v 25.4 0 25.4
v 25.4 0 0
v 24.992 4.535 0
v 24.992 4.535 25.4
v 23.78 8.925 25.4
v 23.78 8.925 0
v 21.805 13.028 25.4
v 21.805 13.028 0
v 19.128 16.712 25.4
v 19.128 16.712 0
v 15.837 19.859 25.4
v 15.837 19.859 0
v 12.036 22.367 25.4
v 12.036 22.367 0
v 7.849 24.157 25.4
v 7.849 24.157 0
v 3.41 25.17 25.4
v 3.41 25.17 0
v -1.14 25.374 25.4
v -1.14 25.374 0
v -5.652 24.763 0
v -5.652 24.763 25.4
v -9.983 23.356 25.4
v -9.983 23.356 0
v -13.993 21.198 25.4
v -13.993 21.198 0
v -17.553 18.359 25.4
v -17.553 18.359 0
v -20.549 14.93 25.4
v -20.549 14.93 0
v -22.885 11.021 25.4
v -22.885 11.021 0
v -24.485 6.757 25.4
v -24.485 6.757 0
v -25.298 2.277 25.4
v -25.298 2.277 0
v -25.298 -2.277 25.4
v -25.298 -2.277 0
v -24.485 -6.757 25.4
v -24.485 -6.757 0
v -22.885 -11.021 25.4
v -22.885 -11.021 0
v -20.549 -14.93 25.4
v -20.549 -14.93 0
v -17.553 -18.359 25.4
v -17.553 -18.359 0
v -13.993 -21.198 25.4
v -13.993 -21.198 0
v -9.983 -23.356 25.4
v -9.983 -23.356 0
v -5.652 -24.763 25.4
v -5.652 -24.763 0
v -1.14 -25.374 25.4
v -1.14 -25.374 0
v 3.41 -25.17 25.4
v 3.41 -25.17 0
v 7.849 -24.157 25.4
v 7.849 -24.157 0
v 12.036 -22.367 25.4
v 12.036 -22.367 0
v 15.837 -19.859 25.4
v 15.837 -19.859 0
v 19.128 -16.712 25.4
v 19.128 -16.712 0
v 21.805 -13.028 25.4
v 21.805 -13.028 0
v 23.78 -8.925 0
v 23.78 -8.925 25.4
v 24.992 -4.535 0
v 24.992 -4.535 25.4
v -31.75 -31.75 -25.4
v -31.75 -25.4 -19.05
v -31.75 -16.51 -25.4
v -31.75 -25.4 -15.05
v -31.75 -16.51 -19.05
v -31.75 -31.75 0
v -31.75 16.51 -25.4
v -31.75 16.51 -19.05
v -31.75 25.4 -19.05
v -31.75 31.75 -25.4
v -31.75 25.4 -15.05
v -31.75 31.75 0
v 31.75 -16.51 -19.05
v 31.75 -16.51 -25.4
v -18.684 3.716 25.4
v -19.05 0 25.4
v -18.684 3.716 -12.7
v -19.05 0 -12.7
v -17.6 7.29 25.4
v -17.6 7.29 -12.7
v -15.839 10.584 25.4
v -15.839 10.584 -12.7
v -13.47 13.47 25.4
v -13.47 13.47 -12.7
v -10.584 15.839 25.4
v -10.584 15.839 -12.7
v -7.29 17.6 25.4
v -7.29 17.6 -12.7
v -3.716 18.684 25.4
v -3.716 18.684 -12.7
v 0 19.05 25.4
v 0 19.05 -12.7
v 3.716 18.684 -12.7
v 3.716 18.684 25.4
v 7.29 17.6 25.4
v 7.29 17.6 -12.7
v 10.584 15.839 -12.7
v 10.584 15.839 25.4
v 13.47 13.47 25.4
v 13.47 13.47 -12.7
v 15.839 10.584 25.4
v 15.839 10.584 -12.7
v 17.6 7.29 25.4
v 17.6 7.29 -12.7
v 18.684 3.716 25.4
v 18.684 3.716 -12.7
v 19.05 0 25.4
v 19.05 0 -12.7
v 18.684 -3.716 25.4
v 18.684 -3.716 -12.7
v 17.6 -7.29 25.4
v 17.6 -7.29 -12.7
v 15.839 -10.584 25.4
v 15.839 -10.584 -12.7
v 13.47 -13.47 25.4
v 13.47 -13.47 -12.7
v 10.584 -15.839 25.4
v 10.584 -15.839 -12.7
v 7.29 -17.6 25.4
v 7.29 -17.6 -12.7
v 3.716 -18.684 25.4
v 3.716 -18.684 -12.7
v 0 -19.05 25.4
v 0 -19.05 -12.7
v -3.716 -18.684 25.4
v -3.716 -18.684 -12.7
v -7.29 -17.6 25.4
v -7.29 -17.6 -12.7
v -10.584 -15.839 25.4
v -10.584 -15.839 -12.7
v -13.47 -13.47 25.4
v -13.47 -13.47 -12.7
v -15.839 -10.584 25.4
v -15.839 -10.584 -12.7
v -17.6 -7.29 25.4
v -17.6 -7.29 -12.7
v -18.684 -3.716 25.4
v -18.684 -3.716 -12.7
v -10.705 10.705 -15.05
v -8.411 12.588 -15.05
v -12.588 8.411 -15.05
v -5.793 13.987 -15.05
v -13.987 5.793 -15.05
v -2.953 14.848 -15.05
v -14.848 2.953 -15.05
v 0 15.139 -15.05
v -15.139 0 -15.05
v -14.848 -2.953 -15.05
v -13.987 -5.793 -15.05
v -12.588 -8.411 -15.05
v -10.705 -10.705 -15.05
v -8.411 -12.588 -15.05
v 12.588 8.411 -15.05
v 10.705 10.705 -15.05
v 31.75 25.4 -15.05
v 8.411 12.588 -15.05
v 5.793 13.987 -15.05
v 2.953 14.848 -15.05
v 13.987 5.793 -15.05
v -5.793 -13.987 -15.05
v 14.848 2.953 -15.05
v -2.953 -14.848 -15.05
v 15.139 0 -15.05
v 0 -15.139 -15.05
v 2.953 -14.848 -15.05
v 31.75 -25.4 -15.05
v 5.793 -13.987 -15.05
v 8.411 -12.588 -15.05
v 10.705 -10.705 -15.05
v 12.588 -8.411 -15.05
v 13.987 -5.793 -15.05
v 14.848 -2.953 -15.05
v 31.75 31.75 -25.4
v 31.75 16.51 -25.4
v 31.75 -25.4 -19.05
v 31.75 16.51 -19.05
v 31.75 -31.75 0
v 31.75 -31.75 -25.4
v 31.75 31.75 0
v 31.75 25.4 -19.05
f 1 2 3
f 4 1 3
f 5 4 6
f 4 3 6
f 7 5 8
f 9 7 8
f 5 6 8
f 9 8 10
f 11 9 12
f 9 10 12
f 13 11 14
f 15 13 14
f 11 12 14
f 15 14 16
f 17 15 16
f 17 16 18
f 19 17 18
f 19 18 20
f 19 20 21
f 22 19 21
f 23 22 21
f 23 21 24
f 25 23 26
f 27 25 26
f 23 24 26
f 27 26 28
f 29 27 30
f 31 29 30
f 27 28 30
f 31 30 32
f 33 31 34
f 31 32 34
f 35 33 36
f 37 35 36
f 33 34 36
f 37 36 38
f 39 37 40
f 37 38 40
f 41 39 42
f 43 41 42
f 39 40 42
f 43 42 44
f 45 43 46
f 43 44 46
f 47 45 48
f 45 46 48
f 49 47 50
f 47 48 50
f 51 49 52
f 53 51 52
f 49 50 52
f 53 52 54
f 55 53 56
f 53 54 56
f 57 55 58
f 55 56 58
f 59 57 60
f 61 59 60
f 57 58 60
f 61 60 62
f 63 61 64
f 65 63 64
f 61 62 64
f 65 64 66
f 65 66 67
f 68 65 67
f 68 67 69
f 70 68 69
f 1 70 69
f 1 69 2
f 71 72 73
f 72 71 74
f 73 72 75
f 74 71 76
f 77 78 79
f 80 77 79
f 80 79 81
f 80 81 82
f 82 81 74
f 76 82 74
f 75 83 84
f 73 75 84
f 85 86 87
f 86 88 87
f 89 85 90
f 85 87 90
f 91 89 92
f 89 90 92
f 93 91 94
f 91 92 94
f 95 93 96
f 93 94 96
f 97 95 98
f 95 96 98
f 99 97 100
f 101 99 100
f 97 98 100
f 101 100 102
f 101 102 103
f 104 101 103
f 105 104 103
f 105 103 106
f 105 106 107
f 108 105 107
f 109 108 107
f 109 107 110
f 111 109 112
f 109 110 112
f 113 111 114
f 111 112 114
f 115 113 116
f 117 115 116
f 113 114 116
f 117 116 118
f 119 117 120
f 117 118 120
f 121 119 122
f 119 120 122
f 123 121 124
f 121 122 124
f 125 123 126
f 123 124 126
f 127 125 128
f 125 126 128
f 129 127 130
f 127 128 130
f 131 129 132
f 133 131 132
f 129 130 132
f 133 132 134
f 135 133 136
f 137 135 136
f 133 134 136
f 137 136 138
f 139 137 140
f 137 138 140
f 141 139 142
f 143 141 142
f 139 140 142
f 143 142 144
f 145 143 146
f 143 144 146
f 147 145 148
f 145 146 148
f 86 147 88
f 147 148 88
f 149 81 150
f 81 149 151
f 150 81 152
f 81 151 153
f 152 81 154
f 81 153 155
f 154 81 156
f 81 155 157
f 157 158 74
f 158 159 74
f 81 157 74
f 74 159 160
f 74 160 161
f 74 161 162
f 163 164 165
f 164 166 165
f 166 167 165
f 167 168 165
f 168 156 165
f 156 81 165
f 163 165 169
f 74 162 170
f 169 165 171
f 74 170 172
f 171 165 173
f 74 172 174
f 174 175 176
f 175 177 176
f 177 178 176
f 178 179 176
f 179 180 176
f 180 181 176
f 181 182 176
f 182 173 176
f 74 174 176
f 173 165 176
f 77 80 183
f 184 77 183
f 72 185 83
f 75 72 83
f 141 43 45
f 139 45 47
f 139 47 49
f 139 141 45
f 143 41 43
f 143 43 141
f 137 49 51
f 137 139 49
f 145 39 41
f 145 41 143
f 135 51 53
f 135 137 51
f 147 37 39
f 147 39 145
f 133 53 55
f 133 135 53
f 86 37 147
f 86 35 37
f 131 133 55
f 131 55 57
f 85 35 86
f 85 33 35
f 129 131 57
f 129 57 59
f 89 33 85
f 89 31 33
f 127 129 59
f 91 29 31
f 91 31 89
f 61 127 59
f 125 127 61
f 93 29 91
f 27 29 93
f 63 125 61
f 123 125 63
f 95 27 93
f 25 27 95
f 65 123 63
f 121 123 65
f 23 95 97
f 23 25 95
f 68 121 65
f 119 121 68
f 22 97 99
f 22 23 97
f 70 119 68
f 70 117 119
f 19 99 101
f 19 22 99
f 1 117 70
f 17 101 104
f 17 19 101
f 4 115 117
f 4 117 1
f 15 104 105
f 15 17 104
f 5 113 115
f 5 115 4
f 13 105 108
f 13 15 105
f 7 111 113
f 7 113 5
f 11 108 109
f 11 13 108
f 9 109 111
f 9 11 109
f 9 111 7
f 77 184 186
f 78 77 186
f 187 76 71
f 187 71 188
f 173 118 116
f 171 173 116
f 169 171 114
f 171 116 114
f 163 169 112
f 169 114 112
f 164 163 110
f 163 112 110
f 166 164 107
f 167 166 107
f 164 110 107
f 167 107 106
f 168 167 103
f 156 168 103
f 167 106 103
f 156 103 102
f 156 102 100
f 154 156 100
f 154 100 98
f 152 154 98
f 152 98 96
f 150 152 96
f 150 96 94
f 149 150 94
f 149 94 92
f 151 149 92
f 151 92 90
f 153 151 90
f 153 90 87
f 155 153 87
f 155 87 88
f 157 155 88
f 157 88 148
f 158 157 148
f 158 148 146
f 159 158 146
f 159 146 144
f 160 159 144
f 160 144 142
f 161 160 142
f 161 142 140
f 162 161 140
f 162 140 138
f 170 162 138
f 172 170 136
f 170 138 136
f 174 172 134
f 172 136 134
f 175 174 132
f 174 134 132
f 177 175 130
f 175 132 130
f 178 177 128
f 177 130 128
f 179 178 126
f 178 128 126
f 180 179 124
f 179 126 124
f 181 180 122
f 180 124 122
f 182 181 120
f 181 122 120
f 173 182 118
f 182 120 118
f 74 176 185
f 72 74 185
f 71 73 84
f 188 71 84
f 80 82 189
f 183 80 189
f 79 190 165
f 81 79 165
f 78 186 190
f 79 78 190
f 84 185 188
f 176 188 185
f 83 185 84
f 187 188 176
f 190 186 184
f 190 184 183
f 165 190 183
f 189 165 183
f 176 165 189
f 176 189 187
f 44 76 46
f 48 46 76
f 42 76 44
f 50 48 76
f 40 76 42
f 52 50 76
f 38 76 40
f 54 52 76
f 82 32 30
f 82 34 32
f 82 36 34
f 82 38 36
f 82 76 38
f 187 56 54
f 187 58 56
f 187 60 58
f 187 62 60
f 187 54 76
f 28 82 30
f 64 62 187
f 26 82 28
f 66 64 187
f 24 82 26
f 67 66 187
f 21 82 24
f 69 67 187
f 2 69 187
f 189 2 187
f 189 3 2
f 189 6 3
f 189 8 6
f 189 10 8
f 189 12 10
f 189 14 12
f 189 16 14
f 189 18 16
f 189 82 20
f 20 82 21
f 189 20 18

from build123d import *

# Parameters (mm, degrees)
F0_R     = 25.4
F1_DEPTH = 25.4
F2_W     = 63.5
F2_H     = 63.5
F3_DEPTH = 25.4
F5_DEPTH = 63.501
F7_D     = 38.1
F7_DEPTH = 38.1
F7_TIP   = 11.4463947925


with BuildPart() as f1:
    # F0 (on Top) → F1 (new body)
    with BuildSketch(Plane.XY):
        Circle(F0_R)
    extrude(amount=F1_DEPTH)

    # F2 (on face) → F3 (join)
    with BuildSketch(Plane.XY):
        Rectangle(F2_W, F2_H)
    extrude(amount=-F3_DEPTH)

    # F4 (on face) → F5 (cut, through all)
    with BuildSketch(Plane.YZ.offset(31.75)):
        Polygon((-25.4, -19.05), (-16.51, -19.05), (-16.51, -25.4), (0, -25.4), (16.51, -25.4), (16.51, -19.05), (25.4, -19.05), (25.4, -15.05), (0, -15.05), (-25.4, -15.05), align=None)
    extrude(amount=-F5_DEPTH, mode=Mode.SUBTRACT)

    # F7
    with Locations(Plane.XY.offset(25.4)):
        with Locations((0, 0)):
            Hole(F7_D / 2, depth=F7_DEPTH)
            with Locations((0, 0, -(F7_DEPTH + F7_TIP / 2))):  # 118° drill point
                Cone(0, F7_D / 2, F7_TIP, mode=Mode.SUBTRACT)


solid = f1.part
